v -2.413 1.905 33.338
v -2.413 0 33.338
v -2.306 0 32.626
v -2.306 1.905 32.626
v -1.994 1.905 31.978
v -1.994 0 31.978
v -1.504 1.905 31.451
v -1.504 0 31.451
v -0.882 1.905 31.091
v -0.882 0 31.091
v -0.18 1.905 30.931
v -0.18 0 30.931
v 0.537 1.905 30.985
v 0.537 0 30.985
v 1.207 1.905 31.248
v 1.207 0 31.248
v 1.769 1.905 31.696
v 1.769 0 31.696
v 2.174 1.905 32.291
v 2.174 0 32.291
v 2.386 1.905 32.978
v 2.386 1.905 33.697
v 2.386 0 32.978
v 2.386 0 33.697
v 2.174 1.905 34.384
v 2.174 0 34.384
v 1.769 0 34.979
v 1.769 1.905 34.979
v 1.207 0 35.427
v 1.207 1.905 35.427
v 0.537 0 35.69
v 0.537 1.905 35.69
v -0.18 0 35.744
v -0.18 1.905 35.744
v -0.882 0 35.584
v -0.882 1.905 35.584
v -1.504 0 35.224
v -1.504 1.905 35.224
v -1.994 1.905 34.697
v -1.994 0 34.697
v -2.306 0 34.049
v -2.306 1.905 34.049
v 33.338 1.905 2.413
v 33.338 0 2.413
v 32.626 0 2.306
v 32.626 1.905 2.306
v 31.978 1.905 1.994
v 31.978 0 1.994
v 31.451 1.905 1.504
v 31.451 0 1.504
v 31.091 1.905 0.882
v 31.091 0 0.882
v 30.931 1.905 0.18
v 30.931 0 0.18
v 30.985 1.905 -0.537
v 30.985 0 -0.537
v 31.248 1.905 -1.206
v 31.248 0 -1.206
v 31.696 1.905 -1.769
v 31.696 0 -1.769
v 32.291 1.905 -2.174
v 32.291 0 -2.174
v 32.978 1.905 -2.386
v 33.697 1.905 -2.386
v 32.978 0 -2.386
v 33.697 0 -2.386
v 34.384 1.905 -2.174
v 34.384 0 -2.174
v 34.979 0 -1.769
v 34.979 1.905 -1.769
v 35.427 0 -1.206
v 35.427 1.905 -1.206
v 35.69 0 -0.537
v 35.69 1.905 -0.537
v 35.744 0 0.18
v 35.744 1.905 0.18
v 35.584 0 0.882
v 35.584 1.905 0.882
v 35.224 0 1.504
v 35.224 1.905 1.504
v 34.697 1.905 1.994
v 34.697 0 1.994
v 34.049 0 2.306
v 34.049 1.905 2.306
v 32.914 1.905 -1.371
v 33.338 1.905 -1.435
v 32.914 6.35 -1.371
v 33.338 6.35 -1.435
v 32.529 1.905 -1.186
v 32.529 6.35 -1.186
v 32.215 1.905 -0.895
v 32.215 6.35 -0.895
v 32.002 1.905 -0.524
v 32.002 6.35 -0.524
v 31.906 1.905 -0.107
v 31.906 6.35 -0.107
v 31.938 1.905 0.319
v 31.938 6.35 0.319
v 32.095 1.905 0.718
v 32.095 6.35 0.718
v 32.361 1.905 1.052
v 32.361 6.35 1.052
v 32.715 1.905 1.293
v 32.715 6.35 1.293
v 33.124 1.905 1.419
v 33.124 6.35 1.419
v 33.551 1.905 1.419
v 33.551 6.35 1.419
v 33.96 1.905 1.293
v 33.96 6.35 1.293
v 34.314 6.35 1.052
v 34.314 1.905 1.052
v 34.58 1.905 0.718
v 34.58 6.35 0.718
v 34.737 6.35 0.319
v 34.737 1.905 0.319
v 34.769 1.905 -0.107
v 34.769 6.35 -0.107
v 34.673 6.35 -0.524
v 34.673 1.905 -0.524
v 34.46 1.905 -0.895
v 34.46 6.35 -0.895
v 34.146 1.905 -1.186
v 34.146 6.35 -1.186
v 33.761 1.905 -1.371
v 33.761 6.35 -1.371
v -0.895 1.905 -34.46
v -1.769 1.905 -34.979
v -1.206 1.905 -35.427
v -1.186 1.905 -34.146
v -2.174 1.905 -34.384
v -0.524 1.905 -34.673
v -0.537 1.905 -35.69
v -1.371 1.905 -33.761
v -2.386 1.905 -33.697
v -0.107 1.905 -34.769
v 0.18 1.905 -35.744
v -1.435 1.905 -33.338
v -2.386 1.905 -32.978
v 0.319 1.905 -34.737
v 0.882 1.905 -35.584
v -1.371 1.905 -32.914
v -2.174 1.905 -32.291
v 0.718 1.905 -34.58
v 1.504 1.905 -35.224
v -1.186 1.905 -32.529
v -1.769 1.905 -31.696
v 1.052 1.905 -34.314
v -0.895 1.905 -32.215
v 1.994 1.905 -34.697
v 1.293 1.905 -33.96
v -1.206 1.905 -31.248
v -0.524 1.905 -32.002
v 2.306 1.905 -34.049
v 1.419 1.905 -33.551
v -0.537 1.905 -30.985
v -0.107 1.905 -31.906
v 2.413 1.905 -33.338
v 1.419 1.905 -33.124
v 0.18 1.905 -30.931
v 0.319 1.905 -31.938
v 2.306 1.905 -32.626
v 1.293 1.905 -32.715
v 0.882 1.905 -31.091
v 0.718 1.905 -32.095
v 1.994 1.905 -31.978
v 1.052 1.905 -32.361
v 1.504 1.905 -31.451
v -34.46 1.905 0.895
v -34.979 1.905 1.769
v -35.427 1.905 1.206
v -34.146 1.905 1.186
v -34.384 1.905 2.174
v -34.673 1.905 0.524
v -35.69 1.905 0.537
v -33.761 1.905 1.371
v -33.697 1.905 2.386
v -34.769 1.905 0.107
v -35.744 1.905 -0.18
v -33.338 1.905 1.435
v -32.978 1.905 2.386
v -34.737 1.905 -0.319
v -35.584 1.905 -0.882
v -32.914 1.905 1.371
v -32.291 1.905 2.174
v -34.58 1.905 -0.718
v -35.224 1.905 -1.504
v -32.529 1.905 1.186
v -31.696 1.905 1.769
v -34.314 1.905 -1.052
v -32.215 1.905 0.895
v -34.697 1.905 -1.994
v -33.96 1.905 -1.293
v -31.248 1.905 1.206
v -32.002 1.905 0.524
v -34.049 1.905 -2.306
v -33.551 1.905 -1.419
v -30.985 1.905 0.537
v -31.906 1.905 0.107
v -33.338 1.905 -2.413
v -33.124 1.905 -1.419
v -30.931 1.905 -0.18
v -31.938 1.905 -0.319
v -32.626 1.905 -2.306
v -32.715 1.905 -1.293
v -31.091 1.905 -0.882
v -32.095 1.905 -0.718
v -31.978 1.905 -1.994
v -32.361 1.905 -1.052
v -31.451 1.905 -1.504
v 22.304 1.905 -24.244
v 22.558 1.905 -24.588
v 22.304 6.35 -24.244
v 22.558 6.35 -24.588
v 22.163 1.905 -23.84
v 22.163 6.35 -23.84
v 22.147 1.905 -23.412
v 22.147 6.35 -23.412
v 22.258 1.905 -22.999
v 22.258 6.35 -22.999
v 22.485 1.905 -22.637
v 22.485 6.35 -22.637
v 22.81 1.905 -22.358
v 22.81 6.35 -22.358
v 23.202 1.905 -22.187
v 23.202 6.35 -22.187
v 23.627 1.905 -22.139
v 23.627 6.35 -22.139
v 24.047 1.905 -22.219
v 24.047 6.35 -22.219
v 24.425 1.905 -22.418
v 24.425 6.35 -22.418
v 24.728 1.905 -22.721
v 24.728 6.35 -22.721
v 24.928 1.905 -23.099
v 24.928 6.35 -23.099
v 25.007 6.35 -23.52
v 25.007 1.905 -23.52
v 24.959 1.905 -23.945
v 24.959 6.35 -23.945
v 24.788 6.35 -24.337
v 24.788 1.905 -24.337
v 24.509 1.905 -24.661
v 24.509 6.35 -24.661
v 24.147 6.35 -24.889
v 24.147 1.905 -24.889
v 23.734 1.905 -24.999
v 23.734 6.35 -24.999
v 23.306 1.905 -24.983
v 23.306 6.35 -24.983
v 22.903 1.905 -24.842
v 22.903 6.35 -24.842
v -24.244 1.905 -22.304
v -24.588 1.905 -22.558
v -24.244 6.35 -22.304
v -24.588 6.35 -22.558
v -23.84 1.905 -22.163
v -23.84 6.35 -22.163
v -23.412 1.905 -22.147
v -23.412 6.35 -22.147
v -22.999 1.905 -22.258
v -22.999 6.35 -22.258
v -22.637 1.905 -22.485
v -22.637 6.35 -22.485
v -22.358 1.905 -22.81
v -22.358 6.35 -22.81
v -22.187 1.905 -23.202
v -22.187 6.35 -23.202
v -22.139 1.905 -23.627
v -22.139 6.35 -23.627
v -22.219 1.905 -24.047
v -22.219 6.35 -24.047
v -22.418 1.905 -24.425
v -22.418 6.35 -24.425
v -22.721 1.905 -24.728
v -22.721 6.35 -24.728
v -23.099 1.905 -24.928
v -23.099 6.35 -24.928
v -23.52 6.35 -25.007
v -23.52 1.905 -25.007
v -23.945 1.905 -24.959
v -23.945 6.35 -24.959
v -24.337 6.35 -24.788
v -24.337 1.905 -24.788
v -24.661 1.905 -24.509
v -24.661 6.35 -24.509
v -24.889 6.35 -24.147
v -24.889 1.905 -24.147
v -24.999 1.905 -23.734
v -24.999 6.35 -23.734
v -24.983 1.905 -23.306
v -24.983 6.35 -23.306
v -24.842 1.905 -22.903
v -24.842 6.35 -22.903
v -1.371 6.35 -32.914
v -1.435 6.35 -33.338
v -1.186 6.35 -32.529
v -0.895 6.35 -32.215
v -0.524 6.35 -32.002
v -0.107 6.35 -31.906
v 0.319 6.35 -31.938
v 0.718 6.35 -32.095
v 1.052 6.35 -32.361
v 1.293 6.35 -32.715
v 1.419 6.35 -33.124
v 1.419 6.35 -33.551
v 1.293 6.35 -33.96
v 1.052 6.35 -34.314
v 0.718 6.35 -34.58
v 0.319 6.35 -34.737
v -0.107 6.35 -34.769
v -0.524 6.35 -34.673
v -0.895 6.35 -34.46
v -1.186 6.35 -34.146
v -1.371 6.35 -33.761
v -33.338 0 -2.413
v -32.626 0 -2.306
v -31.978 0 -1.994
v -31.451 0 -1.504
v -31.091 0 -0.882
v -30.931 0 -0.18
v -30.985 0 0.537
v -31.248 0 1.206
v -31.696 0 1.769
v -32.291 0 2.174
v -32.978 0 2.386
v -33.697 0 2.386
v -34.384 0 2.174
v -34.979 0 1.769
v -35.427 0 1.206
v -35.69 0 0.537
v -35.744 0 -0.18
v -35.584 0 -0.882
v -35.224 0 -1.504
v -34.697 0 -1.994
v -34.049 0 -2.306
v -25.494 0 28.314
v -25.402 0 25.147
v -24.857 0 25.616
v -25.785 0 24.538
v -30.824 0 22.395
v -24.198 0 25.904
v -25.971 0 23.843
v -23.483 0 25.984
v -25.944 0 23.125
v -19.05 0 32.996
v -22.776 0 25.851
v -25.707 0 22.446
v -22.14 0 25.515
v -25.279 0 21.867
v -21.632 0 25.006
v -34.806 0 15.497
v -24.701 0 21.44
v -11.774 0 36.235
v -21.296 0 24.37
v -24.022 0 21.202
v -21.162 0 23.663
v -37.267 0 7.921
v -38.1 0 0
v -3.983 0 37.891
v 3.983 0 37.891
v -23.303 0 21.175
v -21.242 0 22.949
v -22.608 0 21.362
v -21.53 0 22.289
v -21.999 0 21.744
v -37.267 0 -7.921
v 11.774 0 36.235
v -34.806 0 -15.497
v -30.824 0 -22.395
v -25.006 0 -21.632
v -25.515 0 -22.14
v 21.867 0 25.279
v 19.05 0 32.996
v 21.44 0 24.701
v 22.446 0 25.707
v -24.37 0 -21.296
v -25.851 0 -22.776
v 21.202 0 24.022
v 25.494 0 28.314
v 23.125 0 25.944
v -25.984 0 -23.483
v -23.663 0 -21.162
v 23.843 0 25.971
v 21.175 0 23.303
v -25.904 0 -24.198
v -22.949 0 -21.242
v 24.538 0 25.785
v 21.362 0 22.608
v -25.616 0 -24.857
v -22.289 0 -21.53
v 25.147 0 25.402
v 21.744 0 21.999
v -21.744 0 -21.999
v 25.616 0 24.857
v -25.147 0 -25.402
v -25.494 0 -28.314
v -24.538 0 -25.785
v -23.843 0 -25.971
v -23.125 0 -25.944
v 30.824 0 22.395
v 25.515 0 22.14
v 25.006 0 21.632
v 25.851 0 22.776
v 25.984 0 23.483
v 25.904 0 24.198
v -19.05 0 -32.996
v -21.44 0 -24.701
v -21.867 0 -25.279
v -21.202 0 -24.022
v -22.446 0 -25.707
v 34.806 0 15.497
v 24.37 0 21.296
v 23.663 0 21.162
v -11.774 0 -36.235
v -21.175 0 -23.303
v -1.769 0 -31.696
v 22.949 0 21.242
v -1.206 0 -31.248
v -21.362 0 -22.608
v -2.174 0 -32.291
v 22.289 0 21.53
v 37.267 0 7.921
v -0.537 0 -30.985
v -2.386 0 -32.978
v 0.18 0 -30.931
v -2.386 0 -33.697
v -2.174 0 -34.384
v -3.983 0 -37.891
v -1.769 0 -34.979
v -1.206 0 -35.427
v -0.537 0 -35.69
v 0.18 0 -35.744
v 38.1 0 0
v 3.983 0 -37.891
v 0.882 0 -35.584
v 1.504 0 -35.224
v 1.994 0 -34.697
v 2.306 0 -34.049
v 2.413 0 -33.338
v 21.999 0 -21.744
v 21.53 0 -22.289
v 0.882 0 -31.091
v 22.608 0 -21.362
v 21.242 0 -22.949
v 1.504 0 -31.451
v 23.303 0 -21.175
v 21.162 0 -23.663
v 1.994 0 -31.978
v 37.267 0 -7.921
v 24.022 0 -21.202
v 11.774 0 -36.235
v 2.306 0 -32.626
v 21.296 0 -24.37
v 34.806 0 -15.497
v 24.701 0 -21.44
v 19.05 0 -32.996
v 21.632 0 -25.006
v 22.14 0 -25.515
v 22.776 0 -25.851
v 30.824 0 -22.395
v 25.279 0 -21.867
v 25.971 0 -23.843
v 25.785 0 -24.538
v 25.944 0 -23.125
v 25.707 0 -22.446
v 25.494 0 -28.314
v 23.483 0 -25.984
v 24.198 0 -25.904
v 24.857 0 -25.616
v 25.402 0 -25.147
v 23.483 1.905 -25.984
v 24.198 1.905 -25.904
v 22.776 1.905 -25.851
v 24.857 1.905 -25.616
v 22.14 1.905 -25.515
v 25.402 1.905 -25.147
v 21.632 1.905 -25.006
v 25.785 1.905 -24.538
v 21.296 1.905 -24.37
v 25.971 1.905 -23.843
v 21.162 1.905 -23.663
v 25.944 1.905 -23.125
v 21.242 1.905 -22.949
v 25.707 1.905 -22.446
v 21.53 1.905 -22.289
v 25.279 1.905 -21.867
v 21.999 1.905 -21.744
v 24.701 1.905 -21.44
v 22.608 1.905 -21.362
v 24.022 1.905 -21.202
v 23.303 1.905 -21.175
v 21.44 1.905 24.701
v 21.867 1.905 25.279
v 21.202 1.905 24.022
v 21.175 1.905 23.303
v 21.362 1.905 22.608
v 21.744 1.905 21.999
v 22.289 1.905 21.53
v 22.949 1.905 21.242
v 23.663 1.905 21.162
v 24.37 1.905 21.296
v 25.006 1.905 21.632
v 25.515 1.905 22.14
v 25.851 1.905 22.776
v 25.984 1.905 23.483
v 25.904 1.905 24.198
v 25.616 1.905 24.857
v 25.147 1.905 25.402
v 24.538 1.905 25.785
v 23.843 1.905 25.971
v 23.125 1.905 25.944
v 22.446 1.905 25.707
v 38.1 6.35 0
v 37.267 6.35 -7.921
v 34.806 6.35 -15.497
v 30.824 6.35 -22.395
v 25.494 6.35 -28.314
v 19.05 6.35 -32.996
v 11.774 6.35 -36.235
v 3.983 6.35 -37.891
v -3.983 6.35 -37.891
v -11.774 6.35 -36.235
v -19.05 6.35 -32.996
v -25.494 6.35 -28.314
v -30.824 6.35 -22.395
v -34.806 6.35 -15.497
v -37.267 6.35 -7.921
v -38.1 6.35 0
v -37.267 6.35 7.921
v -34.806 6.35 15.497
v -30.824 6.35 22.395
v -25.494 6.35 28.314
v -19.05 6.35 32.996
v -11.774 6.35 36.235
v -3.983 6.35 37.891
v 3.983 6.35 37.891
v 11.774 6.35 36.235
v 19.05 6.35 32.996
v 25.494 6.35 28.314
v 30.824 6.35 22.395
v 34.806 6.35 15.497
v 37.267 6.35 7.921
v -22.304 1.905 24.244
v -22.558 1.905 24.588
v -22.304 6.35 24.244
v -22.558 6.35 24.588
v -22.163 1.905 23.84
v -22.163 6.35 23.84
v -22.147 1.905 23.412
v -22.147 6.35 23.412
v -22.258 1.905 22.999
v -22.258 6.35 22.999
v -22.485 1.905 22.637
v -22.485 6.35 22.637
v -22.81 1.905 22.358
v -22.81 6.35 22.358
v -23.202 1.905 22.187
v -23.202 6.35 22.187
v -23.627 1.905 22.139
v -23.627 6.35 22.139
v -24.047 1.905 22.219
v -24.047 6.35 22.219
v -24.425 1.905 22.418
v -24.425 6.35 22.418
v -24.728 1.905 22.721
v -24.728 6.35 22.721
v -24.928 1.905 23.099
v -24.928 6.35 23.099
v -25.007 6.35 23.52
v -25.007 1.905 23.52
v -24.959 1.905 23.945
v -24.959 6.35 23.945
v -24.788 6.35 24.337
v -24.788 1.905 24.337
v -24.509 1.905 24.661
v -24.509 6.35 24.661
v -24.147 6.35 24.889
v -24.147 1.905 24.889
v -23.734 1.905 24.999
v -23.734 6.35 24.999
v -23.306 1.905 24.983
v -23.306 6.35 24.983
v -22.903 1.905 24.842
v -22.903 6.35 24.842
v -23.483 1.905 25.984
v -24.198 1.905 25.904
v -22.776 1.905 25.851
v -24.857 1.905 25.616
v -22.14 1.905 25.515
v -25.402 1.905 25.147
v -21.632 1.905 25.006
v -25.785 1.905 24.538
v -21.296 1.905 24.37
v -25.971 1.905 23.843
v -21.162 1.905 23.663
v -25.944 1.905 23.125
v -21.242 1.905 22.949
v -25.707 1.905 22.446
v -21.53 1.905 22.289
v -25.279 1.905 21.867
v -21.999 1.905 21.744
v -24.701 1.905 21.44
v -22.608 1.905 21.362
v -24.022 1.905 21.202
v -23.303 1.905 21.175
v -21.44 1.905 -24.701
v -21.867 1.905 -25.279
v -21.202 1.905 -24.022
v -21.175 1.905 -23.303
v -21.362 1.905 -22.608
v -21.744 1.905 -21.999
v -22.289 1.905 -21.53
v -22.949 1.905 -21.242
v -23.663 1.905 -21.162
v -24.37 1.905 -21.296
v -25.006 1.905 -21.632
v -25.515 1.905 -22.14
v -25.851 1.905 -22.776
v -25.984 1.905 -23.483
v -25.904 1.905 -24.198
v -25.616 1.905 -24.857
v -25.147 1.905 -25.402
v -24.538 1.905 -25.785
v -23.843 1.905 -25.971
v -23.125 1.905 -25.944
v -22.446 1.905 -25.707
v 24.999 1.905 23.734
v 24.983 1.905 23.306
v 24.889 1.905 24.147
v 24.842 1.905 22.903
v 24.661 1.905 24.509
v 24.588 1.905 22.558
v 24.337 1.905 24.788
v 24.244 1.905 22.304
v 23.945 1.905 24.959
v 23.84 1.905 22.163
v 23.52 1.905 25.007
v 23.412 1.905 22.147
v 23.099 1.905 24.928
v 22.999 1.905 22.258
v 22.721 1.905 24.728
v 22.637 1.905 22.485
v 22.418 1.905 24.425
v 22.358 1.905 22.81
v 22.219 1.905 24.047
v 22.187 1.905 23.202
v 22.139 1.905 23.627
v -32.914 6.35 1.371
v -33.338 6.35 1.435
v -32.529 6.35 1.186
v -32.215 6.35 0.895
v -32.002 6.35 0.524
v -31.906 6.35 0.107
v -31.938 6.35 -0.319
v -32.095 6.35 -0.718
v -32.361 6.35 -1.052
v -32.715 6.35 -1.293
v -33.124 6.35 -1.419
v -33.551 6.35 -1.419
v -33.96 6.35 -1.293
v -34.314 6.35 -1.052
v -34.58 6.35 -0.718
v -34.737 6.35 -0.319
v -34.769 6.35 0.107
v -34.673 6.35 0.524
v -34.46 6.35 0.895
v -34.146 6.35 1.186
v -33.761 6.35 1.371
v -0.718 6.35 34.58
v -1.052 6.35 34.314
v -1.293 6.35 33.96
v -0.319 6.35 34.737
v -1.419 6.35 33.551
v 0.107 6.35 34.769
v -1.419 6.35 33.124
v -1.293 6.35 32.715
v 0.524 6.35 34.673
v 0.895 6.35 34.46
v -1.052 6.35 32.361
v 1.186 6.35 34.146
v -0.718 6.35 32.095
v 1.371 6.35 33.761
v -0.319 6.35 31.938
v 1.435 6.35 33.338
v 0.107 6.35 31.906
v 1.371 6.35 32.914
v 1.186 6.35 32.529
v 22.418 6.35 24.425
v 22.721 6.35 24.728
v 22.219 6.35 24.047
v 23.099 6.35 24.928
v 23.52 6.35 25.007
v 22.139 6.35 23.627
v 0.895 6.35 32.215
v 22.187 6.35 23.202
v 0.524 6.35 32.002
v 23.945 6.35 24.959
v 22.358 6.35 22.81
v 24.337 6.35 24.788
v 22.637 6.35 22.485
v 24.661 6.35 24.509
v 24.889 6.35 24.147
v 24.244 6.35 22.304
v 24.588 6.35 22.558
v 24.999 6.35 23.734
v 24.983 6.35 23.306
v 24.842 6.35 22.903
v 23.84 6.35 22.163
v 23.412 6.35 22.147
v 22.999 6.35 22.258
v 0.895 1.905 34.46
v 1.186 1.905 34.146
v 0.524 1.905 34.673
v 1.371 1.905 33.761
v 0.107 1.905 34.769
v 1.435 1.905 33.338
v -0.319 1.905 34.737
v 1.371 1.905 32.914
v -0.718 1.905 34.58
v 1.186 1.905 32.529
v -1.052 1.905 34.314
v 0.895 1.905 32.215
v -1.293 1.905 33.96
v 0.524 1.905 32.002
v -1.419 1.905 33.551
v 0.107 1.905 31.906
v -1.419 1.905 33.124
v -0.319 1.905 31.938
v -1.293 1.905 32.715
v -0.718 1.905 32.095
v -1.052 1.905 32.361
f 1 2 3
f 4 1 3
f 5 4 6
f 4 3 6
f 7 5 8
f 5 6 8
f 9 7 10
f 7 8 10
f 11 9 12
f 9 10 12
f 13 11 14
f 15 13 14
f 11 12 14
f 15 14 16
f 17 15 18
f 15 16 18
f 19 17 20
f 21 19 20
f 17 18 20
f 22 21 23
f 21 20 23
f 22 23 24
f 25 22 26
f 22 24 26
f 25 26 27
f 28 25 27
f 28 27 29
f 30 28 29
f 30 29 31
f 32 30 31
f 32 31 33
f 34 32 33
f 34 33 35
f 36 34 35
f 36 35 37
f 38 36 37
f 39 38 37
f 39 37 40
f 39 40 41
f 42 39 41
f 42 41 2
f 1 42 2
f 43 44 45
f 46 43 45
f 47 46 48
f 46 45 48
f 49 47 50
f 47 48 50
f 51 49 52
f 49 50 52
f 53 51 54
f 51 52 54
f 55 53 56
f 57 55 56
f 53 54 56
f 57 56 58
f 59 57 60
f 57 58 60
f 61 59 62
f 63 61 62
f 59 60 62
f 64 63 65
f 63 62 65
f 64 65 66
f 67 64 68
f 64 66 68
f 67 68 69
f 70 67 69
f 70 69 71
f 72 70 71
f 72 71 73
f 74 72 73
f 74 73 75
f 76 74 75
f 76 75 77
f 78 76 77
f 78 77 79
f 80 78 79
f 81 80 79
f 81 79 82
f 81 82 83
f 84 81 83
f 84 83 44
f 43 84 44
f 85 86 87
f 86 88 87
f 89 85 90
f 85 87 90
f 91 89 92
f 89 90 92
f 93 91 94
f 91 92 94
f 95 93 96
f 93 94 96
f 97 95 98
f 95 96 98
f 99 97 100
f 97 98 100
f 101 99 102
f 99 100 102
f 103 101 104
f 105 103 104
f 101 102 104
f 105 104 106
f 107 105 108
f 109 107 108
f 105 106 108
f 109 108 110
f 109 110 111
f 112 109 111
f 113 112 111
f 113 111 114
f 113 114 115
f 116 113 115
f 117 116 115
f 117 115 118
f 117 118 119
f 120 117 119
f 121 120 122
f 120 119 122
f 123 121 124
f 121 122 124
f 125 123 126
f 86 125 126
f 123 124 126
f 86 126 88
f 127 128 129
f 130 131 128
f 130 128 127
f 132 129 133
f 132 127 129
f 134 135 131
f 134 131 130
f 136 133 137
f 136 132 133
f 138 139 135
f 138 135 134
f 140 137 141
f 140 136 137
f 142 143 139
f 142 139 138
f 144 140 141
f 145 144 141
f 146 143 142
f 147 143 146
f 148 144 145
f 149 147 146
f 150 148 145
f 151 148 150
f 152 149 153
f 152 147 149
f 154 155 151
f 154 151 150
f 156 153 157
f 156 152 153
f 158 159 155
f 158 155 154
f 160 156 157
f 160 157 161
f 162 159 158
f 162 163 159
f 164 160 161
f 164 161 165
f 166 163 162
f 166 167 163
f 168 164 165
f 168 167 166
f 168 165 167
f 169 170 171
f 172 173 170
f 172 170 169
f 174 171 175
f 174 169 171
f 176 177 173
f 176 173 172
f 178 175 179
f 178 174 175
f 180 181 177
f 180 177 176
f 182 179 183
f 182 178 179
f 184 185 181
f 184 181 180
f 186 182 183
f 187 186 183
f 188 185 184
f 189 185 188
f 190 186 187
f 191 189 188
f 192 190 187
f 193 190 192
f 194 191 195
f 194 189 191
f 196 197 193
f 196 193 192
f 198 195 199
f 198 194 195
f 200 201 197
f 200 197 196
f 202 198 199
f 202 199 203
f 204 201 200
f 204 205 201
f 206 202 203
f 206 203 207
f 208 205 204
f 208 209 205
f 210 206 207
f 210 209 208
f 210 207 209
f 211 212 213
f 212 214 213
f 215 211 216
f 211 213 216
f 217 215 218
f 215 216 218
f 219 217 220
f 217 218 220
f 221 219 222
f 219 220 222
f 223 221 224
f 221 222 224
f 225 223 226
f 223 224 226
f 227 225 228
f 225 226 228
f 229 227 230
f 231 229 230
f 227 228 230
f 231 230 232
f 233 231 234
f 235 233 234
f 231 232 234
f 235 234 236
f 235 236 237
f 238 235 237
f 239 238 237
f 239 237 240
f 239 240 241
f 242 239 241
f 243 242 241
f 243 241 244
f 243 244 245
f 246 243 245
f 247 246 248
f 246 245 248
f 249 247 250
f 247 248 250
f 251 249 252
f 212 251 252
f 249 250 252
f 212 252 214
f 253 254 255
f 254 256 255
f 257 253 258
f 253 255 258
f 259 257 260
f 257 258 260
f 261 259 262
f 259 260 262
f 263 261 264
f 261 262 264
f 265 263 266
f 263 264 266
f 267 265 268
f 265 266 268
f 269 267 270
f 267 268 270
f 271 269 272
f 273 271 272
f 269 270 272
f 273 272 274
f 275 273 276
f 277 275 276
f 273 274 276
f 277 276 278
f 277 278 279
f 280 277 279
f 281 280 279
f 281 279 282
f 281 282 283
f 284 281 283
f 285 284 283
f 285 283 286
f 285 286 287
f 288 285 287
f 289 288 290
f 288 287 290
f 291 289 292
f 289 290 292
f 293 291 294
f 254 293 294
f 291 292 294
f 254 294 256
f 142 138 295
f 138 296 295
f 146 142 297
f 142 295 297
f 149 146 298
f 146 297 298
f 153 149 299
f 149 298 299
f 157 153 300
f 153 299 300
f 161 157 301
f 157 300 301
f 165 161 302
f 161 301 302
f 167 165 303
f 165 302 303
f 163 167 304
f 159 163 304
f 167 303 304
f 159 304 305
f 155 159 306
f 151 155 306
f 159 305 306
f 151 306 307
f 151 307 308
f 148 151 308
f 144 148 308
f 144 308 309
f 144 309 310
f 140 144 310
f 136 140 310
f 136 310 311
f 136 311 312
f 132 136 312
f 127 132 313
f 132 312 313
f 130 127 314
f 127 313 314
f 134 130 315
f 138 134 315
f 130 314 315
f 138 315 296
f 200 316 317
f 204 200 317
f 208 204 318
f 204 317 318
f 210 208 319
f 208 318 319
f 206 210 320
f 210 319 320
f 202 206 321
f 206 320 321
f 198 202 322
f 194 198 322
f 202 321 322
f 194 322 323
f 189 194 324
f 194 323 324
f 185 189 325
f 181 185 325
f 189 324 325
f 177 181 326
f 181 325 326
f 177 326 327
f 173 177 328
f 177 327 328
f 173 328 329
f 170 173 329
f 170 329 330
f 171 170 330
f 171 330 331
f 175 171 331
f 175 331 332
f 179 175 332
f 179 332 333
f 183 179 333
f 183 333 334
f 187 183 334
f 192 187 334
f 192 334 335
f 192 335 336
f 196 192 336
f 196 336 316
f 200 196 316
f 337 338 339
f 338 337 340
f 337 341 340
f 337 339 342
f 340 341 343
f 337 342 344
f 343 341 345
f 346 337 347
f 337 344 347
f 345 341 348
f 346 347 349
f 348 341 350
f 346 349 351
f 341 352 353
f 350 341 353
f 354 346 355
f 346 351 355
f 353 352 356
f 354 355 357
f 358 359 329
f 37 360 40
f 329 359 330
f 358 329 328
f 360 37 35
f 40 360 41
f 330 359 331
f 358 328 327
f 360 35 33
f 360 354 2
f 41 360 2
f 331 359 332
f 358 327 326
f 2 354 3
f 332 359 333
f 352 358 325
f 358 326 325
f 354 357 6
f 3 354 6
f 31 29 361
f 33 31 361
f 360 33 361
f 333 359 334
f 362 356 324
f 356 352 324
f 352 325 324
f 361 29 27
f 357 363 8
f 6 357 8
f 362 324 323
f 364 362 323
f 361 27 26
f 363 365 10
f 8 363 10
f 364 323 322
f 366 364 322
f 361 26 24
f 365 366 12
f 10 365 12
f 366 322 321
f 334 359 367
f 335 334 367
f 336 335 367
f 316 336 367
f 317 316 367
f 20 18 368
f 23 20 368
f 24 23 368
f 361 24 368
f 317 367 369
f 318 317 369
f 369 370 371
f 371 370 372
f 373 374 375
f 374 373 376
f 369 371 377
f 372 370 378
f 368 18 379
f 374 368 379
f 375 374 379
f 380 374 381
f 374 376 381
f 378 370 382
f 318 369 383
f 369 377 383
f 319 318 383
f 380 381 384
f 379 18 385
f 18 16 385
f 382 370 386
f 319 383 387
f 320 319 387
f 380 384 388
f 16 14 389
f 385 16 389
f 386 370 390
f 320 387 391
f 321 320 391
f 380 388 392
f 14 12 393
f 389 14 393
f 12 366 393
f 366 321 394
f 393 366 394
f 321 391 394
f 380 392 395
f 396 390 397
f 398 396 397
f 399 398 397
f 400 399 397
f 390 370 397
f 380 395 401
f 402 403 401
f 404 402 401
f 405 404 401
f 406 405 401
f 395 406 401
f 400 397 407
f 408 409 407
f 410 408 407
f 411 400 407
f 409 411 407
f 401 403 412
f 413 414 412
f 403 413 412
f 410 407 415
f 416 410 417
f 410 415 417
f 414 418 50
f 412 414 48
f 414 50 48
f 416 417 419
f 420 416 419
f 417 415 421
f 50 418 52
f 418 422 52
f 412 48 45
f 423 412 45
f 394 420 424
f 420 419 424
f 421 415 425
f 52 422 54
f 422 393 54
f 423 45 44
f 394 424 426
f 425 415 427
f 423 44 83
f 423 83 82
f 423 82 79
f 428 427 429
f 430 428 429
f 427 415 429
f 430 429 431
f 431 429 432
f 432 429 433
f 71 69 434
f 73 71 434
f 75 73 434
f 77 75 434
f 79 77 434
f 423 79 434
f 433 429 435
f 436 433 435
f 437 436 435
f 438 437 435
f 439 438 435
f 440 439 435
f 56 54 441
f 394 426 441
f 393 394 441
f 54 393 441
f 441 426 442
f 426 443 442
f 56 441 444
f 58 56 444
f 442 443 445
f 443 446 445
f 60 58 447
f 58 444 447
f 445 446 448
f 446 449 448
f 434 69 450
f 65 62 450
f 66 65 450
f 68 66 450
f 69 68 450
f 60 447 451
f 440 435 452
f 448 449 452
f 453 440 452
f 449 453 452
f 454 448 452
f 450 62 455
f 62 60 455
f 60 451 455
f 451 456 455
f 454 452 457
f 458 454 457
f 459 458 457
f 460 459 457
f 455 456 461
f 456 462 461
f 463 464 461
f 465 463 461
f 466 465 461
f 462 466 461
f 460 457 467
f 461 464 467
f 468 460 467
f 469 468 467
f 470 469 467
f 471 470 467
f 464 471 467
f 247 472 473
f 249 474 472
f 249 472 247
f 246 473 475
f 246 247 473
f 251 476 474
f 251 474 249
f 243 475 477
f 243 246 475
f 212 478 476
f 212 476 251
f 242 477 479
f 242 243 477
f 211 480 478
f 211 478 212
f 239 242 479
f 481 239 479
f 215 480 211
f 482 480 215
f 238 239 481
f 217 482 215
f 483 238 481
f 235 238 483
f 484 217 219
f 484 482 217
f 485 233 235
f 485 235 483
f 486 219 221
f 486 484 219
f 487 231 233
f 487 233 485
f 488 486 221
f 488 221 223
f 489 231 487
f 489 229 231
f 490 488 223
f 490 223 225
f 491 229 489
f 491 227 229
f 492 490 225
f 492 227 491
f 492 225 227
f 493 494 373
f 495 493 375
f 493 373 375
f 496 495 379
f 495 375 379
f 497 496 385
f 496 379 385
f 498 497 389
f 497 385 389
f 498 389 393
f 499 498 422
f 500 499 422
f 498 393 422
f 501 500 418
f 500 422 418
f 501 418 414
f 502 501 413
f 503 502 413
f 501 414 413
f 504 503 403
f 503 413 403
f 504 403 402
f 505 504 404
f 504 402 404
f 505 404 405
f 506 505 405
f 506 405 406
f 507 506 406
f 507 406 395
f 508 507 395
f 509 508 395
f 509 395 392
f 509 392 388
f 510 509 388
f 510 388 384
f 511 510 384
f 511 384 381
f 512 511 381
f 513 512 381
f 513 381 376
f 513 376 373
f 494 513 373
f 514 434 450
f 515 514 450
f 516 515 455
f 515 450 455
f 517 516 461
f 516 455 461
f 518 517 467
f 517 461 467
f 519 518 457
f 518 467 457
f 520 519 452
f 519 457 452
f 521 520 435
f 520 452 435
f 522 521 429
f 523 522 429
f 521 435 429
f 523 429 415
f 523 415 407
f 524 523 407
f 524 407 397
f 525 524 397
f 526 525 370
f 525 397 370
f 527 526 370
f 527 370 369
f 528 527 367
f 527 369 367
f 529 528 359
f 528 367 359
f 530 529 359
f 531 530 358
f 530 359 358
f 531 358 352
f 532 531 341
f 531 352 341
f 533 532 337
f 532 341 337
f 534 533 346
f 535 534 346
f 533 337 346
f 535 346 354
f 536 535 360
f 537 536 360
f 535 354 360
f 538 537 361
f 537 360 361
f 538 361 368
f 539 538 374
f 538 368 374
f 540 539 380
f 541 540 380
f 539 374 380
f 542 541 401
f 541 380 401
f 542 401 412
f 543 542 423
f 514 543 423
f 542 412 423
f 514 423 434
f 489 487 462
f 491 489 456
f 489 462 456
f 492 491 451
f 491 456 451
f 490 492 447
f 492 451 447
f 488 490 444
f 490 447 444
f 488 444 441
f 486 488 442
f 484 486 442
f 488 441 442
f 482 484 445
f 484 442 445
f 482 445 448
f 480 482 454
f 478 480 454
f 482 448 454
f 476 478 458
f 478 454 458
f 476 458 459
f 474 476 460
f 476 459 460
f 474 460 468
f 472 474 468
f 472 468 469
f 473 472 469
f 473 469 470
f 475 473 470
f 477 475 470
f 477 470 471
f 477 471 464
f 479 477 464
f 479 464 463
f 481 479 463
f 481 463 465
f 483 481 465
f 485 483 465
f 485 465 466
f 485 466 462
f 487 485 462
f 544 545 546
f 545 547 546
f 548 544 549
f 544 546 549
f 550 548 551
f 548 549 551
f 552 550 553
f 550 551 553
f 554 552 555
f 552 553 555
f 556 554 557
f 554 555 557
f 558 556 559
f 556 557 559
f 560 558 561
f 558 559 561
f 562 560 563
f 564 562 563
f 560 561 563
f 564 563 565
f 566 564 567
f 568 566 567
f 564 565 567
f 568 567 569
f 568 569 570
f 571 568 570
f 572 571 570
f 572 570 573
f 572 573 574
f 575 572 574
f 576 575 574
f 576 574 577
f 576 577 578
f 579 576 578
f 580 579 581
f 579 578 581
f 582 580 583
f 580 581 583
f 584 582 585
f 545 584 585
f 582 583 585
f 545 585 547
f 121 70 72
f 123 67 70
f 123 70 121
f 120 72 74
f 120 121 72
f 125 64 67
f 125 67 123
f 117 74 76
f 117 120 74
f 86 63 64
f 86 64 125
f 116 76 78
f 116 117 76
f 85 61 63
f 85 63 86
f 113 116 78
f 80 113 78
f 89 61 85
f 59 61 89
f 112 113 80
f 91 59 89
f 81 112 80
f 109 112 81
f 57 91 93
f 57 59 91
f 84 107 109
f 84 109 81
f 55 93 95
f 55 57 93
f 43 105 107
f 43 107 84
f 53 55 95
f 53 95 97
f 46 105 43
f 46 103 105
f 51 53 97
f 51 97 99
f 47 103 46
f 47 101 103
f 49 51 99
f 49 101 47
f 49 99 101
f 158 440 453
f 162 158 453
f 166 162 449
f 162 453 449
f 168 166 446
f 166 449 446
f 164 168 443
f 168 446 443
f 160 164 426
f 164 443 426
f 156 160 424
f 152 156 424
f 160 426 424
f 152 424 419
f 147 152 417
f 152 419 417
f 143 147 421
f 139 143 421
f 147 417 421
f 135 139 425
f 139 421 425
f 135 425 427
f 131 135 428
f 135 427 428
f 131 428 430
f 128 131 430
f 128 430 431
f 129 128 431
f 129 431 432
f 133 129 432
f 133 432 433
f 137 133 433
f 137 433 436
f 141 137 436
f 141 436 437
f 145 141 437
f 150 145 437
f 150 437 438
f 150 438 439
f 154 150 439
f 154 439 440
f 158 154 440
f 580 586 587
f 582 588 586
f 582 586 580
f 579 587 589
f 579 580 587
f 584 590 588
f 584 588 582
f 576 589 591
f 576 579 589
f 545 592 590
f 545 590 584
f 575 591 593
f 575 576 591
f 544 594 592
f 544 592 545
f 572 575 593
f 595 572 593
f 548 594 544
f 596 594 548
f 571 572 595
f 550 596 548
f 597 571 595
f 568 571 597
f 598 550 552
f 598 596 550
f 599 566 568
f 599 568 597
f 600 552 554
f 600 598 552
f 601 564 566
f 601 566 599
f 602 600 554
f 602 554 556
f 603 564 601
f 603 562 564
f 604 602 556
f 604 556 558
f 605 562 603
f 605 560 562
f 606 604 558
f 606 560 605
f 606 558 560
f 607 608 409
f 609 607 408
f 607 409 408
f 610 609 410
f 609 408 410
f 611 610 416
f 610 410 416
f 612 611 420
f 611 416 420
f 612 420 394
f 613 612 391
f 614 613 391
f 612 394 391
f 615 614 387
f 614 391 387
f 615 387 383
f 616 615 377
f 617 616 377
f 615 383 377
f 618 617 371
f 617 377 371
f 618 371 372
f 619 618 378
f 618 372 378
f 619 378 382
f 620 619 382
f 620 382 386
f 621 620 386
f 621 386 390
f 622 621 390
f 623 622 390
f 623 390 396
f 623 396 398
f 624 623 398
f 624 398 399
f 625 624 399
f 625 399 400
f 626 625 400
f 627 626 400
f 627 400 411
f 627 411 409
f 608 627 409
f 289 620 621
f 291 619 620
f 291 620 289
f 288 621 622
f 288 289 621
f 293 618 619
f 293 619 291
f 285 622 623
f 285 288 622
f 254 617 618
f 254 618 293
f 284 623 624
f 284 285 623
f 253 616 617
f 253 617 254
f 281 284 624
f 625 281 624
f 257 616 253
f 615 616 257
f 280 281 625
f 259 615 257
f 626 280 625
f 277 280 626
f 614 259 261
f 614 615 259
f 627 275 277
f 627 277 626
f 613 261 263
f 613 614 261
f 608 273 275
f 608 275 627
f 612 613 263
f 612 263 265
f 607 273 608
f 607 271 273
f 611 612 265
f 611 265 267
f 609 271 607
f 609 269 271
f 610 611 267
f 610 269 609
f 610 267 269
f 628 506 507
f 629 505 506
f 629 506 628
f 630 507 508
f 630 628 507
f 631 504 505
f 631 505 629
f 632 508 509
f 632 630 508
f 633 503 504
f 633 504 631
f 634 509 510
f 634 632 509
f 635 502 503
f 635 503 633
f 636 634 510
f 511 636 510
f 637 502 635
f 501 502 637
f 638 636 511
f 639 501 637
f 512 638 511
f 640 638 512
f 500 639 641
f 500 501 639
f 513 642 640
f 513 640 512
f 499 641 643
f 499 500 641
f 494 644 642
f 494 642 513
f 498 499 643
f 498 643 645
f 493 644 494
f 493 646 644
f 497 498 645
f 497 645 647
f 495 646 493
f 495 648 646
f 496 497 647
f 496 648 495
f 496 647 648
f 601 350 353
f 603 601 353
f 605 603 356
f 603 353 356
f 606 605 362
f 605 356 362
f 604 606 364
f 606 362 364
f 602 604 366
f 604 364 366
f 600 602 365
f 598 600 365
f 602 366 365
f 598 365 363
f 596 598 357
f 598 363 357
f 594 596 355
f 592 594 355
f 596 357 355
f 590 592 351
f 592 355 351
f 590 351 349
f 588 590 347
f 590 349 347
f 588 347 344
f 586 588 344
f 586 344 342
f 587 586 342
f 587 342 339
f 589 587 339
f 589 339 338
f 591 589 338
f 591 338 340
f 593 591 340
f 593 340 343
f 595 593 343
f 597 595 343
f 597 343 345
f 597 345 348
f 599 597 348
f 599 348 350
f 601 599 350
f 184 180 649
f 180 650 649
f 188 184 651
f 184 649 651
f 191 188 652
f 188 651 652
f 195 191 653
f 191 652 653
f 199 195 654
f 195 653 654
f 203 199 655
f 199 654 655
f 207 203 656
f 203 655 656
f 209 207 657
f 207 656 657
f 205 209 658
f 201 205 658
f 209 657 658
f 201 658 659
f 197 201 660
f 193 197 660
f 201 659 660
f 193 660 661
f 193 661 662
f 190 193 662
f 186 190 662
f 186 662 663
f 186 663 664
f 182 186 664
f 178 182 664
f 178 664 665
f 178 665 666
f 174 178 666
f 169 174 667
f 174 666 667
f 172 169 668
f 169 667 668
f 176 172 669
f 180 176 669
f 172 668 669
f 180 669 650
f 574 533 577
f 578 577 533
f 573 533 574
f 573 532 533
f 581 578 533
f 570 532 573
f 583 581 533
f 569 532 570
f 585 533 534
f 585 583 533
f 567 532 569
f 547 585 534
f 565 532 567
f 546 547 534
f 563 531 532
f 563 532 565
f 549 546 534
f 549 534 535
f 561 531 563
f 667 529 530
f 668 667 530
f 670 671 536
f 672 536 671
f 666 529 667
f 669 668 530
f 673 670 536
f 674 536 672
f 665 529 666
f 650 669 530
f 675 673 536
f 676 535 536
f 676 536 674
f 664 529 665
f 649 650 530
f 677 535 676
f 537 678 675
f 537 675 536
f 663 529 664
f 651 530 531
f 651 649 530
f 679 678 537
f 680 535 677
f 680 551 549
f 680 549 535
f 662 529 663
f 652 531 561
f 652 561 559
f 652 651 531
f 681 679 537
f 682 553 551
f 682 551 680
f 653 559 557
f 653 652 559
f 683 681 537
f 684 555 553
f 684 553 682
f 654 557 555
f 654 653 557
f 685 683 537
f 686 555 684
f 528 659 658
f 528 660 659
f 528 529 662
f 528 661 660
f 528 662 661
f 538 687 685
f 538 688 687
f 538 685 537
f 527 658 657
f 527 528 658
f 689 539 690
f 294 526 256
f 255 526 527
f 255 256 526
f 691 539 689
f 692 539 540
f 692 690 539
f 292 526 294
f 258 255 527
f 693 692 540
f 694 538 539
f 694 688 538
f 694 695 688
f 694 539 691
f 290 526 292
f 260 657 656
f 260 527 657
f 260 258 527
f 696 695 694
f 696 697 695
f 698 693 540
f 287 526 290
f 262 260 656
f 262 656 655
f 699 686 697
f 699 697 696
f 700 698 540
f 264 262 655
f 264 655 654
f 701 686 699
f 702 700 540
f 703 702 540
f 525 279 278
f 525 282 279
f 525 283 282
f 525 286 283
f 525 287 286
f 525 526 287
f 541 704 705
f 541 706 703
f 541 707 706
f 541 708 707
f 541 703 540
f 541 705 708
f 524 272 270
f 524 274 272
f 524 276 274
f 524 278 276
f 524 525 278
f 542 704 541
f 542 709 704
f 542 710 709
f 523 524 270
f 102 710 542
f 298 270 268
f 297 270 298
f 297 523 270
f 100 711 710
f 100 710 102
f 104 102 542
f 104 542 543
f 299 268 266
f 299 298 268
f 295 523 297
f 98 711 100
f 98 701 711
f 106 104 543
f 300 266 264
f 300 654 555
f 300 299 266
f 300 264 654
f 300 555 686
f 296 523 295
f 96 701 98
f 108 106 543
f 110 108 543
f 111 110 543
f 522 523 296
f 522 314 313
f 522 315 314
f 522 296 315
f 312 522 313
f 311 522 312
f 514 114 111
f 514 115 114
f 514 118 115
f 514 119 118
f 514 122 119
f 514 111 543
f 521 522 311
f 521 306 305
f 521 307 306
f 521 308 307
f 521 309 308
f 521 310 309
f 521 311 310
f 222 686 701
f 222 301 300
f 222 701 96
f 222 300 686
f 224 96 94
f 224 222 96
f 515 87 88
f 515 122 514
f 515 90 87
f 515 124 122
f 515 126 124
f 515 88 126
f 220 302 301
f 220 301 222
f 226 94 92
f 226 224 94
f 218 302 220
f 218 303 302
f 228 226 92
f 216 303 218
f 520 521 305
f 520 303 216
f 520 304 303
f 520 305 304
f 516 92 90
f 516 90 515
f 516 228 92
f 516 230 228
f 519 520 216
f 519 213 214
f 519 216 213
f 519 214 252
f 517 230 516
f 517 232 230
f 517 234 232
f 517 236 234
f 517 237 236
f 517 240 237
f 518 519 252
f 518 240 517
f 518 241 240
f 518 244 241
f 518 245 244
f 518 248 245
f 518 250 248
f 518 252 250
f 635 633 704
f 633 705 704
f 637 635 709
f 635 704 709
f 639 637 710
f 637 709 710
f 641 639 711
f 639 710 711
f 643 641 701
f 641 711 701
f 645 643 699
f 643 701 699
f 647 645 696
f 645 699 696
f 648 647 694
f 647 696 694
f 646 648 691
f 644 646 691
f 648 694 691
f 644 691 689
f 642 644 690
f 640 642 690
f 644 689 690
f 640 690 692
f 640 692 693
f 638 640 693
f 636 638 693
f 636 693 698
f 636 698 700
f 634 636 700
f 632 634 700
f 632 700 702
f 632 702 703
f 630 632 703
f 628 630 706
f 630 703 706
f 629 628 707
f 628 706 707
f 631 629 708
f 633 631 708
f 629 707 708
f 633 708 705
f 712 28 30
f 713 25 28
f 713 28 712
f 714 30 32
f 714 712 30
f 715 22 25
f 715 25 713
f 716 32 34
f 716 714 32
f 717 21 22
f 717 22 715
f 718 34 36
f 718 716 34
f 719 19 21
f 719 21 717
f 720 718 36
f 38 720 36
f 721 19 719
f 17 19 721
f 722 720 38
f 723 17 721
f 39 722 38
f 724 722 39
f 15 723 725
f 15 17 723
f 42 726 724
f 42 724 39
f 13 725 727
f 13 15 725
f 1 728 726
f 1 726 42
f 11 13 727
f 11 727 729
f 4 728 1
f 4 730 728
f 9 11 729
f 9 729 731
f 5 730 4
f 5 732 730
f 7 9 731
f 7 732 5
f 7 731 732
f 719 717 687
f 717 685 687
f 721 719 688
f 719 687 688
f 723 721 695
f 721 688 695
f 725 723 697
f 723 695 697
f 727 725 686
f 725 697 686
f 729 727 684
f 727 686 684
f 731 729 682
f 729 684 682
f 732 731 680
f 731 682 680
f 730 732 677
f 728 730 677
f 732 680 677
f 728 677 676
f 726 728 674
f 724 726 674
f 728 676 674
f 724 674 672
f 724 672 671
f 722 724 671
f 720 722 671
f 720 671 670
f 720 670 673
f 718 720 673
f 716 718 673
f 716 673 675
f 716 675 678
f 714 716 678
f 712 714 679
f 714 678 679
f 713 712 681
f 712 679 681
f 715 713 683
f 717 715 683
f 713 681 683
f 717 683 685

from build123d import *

# Parameters (mm, degrees)
SKETCH1_R                                      = 38.1
BOSS_EXTRUDE1_DEPTH                            = 6.35
CBORE_FOR_4_BUTTON_HEAD_CAP_SCREW1_D           = 2.8702
CBORE_FOR_4_BUTTON_HEAD_CAP_SCREW1_CBORE_D     = 4.826
CBORE_FOR_4_BUTTON_HEAD_CAP_SCREW1_CBORE_DEPTH = 1.905
CIRPATTERN1_COUNT                              = 8


with BuildPart() as part:
    # Sketch1 → Boss-Extrude1 (new body)
    with BuildSketch(Plane(origin=(0, 0, 0), x_dir=(1, 0, 0), z_dir=(0, 1, 0))):
        Circle(SKETCH1_R)
    extrude(amount=BOSS_EXTRUDE1_DEPTH)

    # CBORE for #4 Button Head Cap Screw1 (through all)
    with Locations(Plane(origin=(0, 0, 0), x_dir=(-1, 0, 0), z_dir=(0, -1, 0))):
        with Locations((0, -33.3375)):
            cbore_for_4_button_head_cap_screw1 = CounterBoreHole(CBORE_FOR_4_BUTTON_HEAD_CAP_SCREW1_D / 2, CBORE_FOR_4_BUTTON_HEAD_CAP_SCREW1_CBORE_D / 2, CBORE_FOR_4_BUTTON_HEAD_CAP_SCREW1_CBORE_DEPTH)

    # CirPattern1: CBORE for #4 Button Head Cap Screw1 ×8 about axis
    cirpattern1_axis = Axis((0, 0, 0), (0, 1, 0))
    for i in range(1, CIRPATTERN1_COUNT):
        add(cbore_for_4_button_head_cap_screw1.rotate(cirpattern1_axis, i * 360 / CIRPATTERN1_COUNT), mode=Mode.SUBTRACT)


solid = part.part
